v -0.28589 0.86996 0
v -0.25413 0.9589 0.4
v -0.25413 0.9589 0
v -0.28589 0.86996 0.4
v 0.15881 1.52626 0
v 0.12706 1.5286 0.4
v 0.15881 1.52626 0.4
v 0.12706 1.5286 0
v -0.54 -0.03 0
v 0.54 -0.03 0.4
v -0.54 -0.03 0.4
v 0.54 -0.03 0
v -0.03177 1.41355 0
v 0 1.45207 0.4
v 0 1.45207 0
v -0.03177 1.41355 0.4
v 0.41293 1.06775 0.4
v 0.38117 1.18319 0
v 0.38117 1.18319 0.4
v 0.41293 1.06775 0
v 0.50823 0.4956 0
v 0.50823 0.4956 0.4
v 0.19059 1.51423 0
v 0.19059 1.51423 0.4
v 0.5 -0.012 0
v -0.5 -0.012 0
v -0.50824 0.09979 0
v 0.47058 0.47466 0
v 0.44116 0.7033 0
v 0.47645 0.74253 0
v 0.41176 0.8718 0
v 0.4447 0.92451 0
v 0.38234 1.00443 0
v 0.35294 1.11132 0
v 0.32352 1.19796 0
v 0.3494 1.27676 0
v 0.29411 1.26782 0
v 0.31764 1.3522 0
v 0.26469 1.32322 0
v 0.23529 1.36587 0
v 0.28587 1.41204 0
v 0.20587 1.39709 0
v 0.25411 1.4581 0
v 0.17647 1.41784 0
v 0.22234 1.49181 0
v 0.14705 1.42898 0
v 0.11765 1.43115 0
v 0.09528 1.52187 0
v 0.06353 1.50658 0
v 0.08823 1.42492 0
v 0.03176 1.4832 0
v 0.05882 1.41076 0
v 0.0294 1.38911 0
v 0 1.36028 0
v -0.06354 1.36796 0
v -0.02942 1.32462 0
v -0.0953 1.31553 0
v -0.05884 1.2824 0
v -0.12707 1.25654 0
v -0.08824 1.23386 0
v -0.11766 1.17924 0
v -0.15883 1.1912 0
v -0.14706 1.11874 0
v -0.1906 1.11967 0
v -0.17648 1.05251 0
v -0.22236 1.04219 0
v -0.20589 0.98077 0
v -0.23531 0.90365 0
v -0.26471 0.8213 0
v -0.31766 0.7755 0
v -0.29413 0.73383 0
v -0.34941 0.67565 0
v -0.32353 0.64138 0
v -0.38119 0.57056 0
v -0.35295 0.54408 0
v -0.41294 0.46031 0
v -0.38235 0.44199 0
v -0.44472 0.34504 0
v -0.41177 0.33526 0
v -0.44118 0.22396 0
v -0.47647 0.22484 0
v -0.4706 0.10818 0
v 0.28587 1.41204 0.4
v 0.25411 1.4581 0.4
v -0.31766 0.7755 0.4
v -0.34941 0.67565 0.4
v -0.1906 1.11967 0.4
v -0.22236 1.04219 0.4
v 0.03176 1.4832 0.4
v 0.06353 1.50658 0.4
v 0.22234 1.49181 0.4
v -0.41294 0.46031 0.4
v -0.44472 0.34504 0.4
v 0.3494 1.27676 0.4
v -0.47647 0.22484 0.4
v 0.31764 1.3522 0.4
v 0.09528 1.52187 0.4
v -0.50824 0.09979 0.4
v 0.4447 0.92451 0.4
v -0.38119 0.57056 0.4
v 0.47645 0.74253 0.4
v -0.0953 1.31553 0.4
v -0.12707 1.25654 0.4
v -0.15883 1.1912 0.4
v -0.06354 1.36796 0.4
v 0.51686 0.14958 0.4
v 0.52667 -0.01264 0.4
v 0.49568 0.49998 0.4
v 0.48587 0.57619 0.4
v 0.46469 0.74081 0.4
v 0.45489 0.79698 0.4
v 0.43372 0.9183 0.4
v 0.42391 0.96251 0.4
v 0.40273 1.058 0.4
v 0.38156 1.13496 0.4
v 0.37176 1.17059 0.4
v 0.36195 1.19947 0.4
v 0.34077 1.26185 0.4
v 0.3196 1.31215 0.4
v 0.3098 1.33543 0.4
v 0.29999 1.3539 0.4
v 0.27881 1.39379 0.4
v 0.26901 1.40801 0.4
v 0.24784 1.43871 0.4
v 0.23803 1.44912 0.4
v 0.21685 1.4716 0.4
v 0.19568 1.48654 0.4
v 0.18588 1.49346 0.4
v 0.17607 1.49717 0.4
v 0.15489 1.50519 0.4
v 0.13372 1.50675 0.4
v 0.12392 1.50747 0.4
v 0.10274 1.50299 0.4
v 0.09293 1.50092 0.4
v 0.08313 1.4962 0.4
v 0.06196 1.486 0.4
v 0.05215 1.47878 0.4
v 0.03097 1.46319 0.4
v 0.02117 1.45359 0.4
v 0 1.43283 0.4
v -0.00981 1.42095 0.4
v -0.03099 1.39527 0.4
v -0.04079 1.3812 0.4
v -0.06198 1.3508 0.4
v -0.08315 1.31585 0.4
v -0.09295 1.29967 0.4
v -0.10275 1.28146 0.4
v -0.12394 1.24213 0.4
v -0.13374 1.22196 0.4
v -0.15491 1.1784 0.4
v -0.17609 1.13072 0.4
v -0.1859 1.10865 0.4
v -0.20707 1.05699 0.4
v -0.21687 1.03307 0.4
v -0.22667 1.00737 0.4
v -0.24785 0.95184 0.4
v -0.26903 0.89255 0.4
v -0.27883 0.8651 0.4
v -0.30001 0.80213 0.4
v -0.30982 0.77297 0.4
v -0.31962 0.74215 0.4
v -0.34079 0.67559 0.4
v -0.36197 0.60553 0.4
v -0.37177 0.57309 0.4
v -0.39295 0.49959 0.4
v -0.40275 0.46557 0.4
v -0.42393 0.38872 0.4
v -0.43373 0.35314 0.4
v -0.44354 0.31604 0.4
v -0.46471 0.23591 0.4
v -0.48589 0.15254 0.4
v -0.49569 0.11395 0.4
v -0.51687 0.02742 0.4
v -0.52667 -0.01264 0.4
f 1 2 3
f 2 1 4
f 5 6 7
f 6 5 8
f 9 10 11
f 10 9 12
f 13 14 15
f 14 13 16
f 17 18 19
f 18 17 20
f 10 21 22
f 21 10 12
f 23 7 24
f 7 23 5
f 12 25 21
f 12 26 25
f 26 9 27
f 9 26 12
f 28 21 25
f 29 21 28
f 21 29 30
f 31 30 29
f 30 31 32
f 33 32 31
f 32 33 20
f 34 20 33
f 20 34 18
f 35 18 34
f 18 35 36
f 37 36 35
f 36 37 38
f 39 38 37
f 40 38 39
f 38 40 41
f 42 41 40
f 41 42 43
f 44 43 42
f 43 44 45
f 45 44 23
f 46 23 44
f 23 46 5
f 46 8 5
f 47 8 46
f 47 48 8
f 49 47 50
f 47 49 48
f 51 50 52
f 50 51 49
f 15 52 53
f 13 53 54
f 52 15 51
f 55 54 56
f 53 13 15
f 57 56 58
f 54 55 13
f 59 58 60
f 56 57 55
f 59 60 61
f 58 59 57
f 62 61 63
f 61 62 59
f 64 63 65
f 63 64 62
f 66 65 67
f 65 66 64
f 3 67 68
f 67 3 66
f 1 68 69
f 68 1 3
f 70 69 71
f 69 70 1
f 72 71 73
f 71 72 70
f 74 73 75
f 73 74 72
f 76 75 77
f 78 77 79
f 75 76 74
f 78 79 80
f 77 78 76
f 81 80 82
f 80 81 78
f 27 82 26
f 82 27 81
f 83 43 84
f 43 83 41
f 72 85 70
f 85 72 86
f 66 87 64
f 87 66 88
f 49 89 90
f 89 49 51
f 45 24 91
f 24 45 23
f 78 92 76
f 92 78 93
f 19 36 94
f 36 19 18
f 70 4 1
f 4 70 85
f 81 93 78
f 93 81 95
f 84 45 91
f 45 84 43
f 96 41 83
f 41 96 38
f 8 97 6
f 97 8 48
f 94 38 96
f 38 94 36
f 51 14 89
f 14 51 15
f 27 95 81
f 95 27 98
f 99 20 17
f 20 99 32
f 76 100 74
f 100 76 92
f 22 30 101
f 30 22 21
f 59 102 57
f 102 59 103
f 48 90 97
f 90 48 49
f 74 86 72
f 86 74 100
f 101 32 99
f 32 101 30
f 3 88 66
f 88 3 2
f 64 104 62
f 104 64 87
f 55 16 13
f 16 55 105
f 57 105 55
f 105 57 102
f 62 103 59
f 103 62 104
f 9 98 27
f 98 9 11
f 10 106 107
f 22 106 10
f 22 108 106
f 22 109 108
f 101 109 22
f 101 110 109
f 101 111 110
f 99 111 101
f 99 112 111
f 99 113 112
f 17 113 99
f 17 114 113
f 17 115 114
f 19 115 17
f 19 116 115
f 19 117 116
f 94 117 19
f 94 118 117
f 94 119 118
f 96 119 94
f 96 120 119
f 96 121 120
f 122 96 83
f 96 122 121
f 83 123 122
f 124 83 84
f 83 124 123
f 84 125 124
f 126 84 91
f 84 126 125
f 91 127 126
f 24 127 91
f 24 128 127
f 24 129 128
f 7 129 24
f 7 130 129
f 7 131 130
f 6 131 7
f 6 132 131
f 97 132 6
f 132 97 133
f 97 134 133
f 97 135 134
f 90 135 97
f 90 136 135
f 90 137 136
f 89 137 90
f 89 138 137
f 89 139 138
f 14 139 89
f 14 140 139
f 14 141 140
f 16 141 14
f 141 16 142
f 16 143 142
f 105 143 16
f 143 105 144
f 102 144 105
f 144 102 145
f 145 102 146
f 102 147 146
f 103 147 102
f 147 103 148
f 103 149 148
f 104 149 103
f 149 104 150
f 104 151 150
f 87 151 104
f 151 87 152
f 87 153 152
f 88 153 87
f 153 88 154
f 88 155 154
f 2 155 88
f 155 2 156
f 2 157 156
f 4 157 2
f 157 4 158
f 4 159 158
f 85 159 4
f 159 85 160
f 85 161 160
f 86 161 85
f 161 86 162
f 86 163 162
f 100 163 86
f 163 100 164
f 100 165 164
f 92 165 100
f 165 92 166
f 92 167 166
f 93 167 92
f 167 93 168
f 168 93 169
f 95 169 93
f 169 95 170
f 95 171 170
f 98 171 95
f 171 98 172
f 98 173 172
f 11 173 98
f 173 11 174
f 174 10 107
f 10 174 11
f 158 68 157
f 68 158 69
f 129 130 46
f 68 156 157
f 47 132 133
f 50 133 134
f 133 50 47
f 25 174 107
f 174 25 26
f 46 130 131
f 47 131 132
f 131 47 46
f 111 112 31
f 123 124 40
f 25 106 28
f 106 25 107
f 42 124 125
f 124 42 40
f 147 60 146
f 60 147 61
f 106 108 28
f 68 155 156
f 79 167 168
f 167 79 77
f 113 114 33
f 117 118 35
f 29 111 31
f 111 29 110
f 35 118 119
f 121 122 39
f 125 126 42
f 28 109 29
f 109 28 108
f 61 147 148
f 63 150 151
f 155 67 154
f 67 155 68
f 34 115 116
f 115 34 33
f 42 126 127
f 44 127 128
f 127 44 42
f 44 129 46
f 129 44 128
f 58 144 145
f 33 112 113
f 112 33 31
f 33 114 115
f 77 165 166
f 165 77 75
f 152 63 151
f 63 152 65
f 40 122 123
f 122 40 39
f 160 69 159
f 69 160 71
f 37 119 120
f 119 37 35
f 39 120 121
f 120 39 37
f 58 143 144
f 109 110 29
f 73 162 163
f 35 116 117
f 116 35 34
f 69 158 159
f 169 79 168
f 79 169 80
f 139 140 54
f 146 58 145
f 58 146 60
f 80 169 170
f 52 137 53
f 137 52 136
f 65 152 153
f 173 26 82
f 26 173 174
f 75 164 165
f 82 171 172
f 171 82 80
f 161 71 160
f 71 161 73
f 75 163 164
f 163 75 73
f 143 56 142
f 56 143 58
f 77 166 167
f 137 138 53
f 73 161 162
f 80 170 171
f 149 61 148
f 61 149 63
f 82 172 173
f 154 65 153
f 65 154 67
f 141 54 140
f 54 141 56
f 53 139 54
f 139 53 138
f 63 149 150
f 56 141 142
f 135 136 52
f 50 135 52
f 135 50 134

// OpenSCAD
points = [
	[0.0, 0.0],
	[0.029411764705882353, 0.12018089316227756],
	[0.058823529411764705, 0.2359647043753647],
	[0.08823529411764705, 0.3472684546034517],
	[0.11764705882352941, 0.45400413411798274],
	[0.14705882352941177, 0.556078195803149],
	[0.1764705882352941, 0.6533909766316055],
	[0.20588235294117646, 0.7458360340353749],
	[0.23529411764705882, 0.8332993808366767],
	[0.2647058823529412, 0.915658598487987],
	[0.29411764705882354, 0.9927818033161192],
	[0.3235294117647059, 1.0645264338769969],
	[0.3529411764705882, 1.1307378188514692],
	[0.38235294117647056, 1.1912474733574143],
	[0.4117647058823529, 1.245871055976488],
	[0.4411764705882353, 1.2944058975163855],
	[0.47058823529411764, 1.336627983043052],
	[0.5, 1.37228822720381],
	[0.5294117647058824, 1.4011078233891652],
	[0.5588235294117647, 1.4227723604191558],
	[0.5882352941176471, 1.4369242708217176],
	[0.6176470588235294, 1.4431529766361961],
	[0.6470588235294118, 1.4409817874616988],
	[0.6764705882352942, 1.4298501012769098],
	[0.7058823529411764, 1.4090886121405333],
	[0.7352941176470588, 1.377883747957598],
	[0.7647058823529411, 1.3352248410278518],
	[0.7941176470588235, 1.2798222362083098],
	[0.8235294117647058, 1.2099734613497852],
	[0.8529411764705882, 1.1233292406309068],
	[0.8823529411764706, 1.0164460040750365],
	[0.9117647058823529, 0.8838152888636676],
	[0.9411764705882353, 0.715311223066938],
	[0.9705882352941176, 0.4866772027741895],
	[1.0, 0.0],
];
difference(){
    
// OUTER COOKIE CUTTER SHAPE
    
    // extrude the outer polygon into a 3D shape
    // this extrusion is thinner than the inner shape to make sure the inner shape "cuts" through it completely
    linear_extrude(0.4)
    
        // x- and y-shift the outer polygon to be roughly centered around the inner shape
        // z-shift the outer polygon so the extruded inner shape cuts all the way through
        translate([-0.54, -0.03, -0.1])
            
            // scale this polygon up a bit to make an outer ring of a cookie cutter
            scale(1.08, 1.08, 1.08)
            
                // generate a polygon to become the outer shape
                polygon(points);        
    
// INNER COOKIE CUTTER SHAPE TO BE SUBTRACTED FROM OUTER

    // extrude the inner polygon into a 3D shape
    // this extrusion is thicker than the outer shape to ensure the inner shape "cuts" completey through the outer shape
    // the "scale" parameter grows the shape as it extrudes to give the finished cutter a narrower edge
    linear_extrude(0.6, scale=1.08) 
    
        // x-shift the shape to 
        translate([-0.5, -0.012, 0]) //x-center the polygon at origin
            
            // generate a polygon to become the inner shape (this is effectively defining a hole)
            polygon(points);
}
